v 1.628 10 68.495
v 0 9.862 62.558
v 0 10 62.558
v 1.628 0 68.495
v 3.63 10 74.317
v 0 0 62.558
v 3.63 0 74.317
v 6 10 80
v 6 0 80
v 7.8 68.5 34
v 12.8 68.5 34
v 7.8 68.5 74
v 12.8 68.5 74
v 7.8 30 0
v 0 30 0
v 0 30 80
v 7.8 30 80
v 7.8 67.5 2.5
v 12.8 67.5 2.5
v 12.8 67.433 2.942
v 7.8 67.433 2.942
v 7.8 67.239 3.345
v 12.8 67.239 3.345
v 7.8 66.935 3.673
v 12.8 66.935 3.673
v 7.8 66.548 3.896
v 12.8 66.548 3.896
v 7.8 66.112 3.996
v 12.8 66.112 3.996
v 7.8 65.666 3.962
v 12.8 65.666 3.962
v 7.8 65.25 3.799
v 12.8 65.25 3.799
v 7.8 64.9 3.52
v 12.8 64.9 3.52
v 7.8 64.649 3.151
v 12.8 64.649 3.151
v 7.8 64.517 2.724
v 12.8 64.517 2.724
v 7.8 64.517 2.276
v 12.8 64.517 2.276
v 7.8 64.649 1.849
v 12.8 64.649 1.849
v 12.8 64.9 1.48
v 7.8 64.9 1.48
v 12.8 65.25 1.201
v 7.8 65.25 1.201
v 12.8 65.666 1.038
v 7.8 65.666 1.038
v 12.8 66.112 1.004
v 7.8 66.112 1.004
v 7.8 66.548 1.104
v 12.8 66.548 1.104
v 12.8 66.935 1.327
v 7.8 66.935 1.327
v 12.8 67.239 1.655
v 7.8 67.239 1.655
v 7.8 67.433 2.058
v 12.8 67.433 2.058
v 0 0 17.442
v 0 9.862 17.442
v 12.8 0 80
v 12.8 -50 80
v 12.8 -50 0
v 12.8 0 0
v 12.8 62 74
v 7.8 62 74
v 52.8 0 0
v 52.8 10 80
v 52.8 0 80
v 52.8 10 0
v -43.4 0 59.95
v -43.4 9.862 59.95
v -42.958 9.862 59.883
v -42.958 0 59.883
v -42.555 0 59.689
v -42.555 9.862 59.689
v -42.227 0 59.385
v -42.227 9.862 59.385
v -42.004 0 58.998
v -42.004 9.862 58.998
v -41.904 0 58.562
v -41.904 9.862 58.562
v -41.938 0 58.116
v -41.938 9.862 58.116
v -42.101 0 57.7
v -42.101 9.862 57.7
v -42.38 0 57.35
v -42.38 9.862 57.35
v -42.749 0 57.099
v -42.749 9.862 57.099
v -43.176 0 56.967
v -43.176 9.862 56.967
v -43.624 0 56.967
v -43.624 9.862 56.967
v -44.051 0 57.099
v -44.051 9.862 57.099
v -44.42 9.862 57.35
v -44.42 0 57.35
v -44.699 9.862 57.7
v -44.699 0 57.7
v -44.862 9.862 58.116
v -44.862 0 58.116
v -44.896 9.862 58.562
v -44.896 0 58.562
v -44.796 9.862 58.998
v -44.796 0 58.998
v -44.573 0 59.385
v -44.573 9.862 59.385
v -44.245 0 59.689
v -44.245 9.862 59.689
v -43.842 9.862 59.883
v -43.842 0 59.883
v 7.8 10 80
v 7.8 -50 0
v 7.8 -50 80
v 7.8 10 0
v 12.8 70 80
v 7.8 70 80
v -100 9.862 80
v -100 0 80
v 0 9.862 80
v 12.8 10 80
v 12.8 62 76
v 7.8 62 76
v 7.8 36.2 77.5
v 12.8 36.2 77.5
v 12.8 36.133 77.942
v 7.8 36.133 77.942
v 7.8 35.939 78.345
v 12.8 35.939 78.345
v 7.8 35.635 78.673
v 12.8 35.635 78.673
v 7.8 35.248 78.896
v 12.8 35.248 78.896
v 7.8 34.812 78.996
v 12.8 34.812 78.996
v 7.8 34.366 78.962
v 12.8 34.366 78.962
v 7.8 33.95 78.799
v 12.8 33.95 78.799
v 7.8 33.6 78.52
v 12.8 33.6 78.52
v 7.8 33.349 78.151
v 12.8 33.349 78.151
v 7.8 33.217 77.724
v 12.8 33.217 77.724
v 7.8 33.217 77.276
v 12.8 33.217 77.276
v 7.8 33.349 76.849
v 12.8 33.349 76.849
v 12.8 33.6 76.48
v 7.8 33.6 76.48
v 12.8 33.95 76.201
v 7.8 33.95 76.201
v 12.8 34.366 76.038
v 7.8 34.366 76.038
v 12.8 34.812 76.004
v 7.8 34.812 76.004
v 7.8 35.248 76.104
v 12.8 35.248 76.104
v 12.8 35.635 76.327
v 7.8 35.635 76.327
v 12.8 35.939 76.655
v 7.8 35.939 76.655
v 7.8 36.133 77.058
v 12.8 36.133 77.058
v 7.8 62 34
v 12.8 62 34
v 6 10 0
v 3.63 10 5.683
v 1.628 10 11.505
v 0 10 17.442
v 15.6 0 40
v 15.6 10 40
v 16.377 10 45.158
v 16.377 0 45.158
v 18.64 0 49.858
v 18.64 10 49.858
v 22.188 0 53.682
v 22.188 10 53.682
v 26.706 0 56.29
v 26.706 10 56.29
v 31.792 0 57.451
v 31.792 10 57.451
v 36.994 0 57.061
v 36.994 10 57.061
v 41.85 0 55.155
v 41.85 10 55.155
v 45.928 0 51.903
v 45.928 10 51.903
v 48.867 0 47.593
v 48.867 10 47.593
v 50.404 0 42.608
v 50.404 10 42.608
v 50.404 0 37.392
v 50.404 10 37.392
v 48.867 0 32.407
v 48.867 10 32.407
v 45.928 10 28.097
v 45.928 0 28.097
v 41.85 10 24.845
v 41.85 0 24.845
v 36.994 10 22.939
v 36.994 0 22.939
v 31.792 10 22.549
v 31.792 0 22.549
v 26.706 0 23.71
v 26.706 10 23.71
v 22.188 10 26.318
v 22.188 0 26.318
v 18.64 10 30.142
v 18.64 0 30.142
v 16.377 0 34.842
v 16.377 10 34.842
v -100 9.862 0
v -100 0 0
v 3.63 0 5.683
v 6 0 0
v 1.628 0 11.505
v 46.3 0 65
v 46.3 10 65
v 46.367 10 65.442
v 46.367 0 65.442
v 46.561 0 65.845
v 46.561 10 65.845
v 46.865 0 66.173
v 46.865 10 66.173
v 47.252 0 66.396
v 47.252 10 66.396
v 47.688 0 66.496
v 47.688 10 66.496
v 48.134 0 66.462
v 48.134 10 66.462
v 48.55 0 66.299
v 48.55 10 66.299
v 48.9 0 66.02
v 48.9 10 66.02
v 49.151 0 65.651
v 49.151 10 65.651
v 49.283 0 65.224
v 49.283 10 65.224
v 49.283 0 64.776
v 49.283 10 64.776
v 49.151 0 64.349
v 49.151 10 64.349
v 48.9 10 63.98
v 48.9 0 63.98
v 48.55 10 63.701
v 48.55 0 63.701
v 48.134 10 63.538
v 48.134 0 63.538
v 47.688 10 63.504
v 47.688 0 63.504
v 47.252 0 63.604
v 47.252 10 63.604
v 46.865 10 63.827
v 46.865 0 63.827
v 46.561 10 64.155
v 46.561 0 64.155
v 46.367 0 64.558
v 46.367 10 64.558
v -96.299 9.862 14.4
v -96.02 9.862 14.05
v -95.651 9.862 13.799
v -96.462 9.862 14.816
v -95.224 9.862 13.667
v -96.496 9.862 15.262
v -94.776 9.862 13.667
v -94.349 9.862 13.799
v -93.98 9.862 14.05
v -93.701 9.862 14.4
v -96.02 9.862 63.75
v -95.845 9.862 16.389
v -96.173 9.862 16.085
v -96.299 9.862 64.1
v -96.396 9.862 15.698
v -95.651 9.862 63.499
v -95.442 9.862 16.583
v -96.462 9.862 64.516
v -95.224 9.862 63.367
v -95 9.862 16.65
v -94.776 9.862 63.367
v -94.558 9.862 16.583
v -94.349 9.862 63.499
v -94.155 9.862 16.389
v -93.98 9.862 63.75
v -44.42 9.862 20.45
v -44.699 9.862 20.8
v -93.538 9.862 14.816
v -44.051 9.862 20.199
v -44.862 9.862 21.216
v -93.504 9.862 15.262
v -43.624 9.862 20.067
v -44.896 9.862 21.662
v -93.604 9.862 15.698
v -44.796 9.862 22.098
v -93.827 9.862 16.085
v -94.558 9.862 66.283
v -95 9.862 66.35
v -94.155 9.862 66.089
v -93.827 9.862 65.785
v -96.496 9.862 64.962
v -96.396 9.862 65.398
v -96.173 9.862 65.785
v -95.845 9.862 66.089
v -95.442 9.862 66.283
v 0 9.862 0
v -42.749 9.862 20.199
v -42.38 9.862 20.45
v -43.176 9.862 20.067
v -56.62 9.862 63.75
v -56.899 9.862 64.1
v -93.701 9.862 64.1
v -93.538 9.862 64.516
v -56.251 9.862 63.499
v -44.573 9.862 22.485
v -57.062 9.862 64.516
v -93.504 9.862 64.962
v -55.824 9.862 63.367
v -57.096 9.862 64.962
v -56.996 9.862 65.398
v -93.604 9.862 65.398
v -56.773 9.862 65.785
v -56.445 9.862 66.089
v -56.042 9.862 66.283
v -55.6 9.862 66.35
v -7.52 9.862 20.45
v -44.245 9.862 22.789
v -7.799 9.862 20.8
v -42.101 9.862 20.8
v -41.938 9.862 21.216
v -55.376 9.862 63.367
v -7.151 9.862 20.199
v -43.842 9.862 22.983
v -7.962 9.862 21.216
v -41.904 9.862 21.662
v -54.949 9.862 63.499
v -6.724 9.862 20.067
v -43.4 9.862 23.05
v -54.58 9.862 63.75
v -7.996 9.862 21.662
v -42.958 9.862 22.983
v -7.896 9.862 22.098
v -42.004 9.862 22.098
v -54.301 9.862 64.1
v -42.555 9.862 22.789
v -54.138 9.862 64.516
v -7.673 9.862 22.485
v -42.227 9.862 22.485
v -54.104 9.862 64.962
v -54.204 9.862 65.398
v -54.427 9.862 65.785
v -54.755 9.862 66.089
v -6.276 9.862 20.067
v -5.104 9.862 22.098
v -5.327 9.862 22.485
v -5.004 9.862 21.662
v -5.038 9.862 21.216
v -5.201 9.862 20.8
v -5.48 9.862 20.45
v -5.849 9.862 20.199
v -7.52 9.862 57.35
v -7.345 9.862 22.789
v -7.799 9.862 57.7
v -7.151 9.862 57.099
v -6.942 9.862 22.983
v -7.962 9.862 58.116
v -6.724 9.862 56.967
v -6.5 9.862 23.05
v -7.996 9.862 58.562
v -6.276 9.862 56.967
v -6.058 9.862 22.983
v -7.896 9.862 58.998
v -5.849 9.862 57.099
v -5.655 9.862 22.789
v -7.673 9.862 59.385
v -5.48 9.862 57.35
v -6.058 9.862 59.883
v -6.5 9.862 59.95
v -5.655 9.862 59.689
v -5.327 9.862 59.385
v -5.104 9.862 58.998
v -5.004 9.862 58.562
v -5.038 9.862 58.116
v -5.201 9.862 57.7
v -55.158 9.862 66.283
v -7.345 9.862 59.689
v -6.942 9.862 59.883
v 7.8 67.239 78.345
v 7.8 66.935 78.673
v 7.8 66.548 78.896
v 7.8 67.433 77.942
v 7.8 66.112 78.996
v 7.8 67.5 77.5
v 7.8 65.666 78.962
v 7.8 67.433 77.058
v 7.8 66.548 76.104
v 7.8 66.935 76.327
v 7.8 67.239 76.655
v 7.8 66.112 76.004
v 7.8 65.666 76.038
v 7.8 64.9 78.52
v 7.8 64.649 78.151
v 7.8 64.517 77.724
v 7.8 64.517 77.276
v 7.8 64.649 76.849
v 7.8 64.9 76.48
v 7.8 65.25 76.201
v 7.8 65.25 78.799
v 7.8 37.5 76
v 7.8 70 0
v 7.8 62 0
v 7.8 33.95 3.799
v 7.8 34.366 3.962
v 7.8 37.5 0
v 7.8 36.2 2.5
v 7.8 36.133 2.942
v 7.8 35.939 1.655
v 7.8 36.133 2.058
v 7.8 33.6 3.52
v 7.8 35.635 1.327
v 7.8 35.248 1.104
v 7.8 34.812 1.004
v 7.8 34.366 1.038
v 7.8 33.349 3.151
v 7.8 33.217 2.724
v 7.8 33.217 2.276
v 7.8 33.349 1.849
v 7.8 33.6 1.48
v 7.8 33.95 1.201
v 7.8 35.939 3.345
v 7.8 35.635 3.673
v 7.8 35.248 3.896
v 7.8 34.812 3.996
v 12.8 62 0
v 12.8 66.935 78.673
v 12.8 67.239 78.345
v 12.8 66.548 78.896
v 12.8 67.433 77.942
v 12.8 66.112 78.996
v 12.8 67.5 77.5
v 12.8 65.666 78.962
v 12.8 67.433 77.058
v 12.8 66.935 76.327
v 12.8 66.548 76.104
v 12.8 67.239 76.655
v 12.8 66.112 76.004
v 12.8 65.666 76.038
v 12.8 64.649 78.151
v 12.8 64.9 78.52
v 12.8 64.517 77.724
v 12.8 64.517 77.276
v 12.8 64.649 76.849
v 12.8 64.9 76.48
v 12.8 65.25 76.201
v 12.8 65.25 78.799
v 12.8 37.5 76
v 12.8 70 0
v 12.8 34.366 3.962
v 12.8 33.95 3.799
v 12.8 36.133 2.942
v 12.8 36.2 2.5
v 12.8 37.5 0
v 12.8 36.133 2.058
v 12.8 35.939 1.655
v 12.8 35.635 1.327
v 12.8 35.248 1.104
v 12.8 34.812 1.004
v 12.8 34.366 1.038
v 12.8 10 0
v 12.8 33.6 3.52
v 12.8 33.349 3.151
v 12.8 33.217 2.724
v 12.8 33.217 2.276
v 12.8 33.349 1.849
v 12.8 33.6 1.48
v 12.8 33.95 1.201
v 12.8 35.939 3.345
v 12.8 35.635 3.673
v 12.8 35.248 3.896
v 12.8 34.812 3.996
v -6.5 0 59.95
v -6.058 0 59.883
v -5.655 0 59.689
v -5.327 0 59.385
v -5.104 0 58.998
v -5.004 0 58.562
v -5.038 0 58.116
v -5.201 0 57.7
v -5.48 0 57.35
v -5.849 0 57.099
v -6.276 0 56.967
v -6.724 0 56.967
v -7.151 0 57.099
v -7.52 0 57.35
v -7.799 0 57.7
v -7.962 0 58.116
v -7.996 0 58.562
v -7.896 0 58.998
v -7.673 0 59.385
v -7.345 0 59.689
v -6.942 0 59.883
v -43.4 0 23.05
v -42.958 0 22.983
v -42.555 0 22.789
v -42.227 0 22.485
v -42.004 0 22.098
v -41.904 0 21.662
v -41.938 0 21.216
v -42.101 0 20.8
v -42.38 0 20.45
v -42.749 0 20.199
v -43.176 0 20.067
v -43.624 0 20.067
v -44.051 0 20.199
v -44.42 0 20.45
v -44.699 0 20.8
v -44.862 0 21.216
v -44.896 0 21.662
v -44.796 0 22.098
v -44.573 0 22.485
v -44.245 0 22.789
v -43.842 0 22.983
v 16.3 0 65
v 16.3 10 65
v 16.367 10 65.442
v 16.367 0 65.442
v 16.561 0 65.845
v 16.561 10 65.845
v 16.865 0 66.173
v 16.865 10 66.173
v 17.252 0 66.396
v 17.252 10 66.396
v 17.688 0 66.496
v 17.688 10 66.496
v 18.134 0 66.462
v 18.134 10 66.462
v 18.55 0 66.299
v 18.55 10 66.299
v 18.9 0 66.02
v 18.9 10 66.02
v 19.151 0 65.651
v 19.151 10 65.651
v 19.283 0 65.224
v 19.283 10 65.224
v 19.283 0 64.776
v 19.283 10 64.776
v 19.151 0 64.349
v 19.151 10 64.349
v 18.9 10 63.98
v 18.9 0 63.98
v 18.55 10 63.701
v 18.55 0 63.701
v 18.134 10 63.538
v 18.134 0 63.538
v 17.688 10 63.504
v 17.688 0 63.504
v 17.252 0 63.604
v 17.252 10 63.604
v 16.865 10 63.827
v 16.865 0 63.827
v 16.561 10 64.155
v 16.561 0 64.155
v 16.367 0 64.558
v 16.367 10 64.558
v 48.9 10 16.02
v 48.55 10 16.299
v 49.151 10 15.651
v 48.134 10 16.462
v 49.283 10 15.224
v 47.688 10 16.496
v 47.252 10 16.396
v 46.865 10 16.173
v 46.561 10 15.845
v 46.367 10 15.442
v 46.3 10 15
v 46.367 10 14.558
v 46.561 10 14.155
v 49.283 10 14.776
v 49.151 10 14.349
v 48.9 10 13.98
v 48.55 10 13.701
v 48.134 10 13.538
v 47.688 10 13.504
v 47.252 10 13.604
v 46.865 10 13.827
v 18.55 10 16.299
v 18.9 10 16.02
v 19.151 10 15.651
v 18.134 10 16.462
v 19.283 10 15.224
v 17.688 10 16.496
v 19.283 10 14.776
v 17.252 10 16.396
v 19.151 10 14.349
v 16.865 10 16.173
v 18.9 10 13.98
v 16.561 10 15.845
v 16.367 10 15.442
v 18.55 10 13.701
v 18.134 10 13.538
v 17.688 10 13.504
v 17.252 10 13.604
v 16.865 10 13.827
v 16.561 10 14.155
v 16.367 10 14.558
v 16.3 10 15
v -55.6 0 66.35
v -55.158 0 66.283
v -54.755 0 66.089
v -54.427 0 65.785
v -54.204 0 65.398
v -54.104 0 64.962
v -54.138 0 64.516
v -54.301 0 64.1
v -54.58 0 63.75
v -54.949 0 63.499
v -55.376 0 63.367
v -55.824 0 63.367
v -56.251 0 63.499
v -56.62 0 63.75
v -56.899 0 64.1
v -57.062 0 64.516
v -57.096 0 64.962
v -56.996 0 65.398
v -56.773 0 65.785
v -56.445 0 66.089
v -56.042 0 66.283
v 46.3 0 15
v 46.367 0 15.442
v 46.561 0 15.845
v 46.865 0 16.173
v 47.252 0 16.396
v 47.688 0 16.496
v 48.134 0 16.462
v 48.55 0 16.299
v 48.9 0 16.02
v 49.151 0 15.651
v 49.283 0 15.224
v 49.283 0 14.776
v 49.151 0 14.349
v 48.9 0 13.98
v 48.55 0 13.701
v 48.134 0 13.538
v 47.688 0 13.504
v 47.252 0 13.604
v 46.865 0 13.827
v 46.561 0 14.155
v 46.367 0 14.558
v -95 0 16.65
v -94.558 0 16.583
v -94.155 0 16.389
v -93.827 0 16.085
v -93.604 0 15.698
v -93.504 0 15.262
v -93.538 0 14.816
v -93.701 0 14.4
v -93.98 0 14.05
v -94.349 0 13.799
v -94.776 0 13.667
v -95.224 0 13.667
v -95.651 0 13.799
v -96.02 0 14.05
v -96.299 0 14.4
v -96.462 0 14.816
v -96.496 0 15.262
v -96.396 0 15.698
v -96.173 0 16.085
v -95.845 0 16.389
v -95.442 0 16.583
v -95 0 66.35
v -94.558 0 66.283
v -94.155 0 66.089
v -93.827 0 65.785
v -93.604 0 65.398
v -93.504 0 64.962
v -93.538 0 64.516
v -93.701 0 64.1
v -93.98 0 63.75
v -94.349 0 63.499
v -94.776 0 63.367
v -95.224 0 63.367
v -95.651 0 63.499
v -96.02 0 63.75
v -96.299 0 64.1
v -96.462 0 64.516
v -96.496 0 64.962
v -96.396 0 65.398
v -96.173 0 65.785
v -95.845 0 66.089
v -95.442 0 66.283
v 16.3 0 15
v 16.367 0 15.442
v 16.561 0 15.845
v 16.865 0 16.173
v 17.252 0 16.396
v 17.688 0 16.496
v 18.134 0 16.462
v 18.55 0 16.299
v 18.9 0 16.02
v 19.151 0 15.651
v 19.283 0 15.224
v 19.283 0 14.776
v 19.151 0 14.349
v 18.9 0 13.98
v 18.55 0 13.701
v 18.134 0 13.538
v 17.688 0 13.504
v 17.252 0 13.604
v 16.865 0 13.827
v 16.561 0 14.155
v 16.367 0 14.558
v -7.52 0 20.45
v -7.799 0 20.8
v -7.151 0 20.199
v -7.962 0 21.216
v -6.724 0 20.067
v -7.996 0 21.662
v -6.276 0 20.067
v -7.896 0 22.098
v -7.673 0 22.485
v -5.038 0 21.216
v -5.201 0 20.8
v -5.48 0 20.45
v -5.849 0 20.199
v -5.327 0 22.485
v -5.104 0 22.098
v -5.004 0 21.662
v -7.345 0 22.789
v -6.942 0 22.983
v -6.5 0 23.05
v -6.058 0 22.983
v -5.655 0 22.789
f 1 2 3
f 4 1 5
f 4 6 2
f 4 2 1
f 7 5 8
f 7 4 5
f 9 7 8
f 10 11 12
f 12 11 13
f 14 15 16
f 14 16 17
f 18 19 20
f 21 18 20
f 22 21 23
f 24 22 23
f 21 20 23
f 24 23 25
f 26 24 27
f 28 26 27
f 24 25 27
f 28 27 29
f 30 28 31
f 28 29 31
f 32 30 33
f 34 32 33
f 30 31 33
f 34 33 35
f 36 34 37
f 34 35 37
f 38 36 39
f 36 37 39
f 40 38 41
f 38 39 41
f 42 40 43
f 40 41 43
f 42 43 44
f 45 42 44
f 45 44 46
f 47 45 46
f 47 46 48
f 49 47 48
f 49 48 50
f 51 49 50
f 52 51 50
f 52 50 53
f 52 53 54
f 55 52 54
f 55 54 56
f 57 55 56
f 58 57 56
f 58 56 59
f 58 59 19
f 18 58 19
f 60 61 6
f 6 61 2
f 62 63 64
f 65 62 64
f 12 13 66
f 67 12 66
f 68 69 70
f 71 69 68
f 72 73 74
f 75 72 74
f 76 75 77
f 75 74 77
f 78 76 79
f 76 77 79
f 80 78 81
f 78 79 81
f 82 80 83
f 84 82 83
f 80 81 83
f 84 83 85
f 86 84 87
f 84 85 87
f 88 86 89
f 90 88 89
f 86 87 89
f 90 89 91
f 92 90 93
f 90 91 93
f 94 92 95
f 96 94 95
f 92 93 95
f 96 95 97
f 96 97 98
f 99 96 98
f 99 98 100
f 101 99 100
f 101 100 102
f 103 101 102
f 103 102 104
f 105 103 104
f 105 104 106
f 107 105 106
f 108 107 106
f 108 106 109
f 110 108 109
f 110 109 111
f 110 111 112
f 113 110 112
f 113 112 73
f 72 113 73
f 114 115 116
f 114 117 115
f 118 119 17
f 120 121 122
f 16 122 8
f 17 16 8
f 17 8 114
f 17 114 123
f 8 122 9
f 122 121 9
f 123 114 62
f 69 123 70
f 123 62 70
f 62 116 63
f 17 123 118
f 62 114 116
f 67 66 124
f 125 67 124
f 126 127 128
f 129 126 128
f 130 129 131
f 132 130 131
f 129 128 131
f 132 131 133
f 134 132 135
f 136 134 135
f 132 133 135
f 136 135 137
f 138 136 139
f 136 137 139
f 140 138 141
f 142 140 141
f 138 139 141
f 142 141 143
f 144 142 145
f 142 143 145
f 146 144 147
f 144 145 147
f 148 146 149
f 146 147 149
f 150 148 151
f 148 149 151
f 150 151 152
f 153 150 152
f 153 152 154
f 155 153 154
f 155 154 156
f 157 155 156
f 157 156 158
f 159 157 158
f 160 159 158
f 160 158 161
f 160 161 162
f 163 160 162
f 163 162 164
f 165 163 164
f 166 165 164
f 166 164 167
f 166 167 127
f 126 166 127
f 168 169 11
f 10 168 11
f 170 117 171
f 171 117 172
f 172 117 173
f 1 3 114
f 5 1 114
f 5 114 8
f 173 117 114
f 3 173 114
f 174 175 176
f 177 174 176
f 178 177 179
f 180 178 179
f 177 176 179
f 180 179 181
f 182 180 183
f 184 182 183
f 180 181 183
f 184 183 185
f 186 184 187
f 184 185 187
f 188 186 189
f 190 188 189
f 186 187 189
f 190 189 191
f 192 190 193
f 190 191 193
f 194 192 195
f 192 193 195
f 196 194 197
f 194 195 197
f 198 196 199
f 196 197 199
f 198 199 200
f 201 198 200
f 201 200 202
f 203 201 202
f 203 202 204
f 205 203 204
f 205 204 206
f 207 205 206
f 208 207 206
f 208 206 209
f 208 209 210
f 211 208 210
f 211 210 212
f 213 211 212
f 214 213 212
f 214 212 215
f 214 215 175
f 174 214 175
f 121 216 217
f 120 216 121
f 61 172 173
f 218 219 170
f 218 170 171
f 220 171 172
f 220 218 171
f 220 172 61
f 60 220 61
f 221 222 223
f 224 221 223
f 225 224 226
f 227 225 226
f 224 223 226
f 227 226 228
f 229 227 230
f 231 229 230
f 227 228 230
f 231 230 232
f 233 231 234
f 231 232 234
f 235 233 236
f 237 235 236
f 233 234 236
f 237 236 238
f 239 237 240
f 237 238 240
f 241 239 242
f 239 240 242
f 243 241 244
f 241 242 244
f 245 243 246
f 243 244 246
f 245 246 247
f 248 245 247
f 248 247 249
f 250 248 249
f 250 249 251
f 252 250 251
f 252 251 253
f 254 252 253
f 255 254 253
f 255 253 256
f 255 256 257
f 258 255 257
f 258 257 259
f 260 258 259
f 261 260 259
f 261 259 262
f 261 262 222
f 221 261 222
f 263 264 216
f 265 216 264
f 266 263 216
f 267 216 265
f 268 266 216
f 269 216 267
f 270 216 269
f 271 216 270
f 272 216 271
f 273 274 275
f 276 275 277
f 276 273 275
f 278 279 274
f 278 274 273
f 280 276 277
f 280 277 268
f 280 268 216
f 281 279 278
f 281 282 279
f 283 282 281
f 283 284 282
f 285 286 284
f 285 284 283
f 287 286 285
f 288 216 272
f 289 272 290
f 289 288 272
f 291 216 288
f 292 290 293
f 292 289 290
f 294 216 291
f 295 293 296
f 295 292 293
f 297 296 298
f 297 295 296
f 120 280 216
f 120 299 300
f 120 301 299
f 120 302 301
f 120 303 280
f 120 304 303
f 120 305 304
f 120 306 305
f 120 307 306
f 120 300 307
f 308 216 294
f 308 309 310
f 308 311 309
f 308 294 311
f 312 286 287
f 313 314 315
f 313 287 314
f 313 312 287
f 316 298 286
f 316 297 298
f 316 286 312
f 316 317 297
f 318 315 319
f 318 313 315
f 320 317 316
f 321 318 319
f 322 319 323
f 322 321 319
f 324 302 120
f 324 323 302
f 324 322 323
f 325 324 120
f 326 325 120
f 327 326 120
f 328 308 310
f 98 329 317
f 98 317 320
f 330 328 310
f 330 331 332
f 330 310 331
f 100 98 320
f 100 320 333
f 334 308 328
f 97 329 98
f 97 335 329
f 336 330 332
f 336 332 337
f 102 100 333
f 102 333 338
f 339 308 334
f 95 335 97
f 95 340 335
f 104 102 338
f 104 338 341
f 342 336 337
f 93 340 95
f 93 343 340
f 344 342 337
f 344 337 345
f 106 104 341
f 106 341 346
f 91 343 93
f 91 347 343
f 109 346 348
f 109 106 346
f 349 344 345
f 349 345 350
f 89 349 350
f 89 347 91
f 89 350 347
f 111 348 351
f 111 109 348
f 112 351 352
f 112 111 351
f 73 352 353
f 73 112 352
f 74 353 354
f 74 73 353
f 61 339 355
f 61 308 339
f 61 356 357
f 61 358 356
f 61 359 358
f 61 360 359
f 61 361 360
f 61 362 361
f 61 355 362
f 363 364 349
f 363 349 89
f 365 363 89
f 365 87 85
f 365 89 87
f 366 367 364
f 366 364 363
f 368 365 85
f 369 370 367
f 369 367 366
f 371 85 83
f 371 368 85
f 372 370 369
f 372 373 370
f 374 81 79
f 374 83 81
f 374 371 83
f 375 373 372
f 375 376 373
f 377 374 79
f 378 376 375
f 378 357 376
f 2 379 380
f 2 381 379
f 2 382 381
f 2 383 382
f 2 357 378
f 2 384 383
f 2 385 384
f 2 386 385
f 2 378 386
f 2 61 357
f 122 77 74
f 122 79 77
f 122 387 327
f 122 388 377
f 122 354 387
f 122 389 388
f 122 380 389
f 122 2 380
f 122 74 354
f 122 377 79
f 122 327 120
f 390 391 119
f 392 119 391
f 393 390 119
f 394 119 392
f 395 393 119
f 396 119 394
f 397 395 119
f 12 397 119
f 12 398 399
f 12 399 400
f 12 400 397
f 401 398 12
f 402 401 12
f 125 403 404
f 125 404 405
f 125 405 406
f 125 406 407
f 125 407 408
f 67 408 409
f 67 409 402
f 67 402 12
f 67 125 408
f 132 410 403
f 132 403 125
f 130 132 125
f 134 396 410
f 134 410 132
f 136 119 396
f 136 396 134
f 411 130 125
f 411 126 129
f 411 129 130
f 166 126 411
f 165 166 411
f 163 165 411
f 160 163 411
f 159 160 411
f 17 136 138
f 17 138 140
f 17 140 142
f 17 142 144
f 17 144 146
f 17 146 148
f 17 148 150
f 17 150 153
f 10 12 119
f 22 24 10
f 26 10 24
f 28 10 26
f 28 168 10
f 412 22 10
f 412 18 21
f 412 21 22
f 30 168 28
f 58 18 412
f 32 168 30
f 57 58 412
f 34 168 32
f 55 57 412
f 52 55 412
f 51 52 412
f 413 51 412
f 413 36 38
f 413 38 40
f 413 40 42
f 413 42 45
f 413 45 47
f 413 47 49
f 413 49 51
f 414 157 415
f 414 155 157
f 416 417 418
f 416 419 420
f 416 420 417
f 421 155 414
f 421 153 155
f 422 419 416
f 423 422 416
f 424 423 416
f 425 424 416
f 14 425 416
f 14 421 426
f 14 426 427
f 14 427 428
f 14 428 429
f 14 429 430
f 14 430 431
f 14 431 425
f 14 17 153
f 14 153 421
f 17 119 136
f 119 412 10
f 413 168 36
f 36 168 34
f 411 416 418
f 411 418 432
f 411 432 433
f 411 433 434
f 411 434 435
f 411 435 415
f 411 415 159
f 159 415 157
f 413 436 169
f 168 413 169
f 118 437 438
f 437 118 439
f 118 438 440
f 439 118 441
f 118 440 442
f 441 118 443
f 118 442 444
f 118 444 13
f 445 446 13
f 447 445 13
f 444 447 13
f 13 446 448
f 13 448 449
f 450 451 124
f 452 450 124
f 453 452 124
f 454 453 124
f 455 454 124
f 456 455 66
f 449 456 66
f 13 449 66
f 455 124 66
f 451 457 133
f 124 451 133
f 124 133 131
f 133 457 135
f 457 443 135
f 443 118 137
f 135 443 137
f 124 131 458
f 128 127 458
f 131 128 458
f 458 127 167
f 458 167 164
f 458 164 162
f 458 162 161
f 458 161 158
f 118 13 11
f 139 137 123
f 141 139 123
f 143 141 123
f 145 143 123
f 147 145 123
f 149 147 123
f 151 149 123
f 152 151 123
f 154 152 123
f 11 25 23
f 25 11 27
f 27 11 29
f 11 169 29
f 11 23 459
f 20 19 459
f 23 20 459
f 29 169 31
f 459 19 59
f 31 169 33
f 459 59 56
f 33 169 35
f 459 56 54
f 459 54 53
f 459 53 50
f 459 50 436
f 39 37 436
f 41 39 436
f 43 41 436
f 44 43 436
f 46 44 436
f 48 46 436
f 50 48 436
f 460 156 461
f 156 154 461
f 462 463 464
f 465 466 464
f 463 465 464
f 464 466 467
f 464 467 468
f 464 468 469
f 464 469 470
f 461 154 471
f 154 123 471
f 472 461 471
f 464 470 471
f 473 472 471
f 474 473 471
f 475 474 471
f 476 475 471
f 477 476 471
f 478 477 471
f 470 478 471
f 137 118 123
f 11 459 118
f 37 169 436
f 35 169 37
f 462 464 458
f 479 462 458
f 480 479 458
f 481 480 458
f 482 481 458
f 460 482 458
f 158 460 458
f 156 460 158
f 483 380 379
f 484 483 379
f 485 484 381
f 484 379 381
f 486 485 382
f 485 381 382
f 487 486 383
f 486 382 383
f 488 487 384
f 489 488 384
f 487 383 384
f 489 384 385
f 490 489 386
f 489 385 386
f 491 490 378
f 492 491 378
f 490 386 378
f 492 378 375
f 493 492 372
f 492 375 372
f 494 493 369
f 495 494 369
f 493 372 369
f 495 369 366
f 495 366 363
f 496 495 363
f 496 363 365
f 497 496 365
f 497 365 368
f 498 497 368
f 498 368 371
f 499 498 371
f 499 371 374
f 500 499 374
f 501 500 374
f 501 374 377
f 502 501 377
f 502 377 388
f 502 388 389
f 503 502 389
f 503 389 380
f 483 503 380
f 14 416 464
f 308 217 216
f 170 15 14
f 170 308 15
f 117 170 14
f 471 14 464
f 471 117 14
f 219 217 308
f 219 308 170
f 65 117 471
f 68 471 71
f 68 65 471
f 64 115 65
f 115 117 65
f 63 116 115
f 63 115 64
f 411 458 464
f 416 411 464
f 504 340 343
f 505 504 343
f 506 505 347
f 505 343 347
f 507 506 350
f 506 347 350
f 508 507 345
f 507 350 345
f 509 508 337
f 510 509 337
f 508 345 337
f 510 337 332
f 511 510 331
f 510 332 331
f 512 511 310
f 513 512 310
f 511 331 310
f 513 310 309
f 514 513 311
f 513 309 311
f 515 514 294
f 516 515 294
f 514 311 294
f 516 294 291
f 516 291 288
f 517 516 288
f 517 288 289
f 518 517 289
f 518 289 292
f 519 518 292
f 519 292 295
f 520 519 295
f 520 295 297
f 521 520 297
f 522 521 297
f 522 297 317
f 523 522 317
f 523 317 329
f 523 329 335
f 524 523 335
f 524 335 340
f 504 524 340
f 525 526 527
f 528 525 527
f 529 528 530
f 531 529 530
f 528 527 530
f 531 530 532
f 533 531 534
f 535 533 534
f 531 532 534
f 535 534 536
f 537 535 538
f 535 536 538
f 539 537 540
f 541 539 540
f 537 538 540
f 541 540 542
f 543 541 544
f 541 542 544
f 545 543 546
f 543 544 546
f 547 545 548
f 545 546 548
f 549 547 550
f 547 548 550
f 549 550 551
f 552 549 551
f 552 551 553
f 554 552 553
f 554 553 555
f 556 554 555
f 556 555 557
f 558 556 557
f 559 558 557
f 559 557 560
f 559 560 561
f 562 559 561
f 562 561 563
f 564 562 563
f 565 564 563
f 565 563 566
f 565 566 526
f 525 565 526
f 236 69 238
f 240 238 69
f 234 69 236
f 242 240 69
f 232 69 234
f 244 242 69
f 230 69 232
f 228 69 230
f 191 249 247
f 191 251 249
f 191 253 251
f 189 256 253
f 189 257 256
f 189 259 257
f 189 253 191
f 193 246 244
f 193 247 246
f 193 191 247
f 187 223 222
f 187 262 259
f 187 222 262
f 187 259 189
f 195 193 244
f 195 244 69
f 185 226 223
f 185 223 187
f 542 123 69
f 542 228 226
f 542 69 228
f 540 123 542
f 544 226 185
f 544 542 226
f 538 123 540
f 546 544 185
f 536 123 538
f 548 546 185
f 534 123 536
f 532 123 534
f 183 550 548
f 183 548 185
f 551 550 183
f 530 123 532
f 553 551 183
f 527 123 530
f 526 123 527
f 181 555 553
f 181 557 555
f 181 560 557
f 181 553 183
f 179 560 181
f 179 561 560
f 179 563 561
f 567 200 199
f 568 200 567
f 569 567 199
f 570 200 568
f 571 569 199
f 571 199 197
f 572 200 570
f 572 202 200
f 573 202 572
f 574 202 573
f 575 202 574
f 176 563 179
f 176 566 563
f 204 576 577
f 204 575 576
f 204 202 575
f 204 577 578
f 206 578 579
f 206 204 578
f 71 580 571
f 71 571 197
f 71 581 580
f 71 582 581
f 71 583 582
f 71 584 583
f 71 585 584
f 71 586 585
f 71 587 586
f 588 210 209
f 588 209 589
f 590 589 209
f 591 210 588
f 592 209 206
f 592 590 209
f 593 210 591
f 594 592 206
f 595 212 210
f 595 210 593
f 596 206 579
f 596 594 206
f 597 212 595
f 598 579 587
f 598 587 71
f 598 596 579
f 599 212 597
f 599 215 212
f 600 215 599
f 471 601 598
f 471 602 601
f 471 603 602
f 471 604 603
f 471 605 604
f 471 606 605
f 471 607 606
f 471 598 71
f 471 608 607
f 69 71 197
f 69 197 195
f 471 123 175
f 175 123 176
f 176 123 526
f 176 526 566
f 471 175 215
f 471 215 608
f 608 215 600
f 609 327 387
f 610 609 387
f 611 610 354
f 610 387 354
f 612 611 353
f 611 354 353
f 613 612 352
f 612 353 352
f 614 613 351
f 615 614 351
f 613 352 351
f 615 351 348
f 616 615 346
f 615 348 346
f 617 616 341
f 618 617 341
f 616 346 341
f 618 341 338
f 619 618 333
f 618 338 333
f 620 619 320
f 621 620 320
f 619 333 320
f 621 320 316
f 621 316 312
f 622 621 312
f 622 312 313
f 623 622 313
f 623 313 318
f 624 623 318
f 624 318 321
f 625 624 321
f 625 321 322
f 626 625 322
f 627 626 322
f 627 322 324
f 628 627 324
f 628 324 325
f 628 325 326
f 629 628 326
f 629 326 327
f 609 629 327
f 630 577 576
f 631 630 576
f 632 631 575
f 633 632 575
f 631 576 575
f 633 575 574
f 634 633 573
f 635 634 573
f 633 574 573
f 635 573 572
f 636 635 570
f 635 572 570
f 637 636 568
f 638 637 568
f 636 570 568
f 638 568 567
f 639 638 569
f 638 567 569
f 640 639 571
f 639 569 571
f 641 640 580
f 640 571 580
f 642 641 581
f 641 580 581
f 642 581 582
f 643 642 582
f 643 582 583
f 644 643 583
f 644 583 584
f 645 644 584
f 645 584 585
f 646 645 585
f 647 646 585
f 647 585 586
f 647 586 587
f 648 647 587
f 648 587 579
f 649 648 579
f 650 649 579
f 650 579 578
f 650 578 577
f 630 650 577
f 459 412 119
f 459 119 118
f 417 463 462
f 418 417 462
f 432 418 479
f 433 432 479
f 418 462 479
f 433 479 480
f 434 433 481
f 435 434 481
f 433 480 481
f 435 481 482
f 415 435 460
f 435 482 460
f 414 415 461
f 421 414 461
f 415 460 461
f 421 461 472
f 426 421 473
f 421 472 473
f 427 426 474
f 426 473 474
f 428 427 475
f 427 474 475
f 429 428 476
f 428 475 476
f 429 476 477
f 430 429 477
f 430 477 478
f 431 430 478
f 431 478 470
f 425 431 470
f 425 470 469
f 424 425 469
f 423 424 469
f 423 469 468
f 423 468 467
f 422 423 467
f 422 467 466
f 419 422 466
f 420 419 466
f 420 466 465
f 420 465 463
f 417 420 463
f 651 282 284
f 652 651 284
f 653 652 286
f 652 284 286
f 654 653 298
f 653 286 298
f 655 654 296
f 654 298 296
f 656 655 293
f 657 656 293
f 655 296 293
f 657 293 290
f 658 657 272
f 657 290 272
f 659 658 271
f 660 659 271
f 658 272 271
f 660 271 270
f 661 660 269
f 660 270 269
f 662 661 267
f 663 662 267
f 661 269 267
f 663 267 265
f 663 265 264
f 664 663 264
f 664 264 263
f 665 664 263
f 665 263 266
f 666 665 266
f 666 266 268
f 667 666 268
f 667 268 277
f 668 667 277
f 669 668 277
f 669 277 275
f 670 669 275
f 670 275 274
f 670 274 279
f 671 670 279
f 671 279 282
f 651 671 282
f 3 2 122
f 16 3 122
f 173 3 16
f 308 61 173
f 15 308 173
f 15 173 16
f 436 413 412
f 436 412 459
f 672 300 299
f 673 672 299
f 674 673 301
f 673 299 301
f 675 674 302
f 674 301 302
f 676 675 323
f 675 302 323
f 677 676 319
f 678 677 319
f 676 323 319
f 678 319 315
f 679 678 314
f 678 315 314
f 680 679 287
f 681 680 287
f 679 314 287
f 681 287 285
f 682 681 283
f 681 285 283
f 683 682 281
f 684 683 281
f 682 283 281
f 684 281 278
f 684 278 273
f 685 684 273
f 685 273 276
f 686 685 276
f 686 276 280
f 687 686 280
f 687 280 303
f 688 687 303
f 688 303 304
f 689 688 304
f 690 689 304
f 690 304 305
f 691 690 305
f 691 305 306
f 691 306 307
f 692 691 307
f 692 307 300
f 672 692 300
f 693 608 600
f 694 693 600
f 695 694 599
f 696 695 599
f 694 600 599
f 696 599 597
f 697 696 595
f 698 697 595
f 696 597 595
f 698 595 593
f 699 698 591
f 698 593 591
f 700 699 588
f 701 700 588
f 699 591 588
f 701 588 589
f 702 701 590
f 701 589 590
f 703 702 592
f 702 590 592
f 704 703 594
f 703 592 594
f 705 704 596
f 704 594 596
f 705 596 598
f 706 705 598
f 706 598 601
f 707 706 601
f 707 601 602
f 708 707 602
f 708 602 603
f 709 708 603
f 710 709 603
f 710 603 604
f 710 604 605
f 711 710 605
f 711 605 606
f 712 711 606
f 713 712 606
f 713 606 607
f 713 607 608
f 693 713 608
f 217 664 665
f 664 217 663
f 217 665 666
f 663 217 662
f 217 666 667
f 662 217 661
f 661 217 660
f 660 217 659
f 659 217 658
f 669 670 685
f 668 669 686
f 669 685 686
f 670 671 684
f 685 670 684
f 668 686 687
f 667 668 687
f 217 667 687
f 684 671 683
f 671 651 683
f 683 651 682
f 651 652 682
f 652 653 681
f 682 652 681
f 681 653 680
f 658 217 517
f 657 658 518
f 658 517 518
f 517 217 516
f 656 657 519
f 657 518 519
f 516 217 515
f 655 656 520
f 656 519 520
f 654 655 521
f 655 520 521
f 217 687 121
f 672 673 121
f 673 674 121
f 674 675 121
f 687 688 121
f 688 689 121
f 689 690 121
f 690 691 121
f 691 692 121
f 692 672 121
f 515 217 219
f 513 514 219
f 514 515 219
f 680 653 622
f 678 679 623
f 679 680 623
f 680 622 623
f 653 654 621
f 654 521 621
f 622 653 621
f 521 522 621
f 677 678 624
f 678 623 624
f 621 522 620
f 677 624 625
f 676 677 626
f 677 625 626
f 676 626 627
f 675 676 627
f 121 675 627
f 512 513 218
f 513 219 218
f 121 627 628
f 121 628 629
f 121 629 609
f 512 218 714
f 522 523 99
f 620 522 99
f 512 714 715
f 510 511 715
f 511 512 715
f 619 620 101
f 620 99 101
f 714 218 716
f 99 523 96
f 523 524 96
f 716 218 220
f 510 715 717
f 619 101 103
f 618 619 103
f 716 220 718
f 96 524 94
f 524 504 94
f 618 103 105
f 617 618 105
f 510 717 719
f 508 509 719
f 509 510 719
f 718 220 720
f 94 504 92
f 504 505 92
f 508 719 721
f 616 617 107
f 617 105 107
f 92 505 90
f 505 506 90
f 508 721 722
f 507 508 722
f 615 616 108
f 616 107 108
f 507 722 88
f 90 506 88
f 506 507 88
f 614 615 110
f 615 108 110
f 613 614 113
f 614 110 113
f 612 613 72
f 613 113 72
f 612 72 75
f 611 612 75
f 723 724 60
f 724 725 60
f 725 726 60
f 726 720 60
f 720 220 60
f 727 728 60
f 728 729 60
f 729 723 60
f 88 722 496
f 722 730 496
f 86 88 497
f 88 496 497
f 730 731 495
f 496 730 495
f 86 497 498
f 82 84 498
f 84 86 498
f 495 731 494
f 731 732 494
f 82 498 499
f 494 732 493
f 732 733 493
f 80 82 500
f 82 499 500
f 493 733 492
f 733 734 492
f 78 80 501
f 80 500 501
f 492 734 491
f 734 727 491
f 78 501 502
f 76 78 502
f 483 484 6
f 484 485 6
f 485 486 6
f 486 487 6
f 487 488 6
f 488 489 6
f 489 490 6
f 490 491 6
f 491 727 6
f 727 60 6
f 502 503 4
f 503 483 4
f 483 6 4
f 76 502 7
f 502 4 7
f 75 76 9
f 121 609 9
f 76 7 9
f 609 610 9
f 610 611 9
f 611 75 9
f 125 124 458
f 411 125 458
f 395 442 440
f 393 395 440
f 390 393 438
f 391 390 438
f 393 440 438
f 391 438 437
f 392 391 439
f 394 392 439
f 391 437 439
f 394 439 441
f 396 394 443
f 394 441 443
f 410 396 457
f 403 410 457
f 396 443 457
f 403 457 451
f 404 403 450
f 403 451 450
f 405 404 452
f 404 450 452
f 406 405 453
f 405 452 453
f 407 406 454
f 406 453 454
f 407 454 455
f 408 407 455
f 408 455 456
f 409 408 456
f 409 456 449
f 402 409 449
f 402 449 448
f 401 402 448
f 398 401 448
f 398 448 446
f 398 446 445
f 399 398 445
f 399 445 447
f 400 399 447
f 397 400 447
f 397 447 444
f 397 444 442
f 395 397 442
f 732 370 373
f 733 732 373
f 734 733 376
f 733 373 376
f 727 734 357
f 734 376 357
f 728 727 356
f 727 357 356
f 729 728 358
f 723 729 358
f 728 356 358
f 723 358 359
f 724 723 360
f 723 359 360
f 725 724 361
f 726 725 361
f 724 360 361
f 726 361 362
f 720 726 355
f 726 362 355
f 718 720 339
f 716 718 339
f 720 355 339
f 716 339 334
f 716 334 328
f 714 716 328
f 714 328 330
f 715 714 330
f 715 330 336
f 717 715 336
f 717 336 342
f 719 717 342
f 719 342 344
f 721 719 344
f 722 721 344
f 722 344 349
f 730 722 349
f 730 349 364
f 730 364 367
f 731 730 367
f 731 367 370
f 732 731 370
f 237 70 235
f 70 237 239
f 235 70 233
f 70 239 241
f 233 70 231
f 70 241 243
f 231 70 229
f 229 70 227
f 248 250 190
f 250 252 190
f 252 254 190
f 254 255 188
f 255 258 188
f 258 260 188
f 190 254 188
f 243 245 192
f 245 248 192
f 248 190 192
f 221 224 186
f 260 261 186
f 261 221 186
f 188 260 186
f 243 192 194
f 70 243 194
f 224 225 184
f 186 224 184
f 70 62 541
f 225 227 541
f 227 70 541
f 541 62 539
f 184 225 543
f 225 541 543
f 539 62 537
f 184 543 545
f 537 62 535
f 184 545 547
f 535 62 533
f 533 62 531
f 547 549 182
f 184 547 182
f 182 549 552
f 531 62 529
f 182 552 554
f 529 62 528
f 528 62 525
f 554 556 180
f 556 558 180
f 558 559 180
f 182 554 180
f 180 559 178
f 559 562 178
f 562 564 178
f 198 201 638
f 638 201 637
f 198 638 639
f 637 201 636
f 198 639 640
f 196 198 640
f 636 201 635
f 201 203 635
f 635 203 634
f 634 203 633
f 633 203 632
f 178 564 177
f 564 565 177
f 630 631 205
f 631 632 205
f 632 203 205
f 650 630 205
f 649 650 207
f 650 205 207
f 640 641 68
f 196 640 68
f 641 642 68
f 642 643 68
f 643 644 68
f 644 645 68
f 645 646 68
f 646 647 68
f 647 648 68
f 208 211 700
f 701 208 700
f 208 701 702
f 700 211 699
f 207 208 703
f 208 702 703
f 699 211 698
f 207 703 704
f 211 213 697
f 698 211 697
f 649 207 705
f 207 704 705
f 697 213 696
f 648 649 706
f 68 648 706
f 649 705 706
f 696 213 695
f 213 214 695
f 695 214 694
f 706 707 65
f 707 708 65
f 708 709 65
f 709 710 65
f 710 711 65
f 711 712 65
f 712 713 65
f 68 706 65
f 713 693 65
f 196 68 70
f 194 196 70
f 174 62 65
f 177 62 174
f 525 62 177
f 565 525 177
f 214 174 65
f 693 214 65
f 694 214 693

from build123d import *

# Parameters (mm, degrees)
BOSS_EXTRUDE1_DEPTH   = 80
CORTE_EXTRUS_O1_DEPTH = 10
SKETCH3_W             = 5
SKETCH3_H             = 80
BOSS_EXTRUDE2_DEPTH   = 50
SKETCH4_W             = 80
SKETCH4_H             = 9.86245083
BOSS_EXTRUDE3_DEPTH   = 100
SKETCH5_R             = 1.5
CUT_EXTRUDE1_DEPTH    = 40
SKETCH6_W             = 5
SKETCH6_H             = 80
BOSS_EXTRUDE4_DEPTH   = 40
SKETCH7_R             = 1.5
CUT_EXTRUDE2_DEPTH    = 40
SKETCH8_W             = 80
SKETCH8_H             = 10
BOSS_EXTRUDE5_DEPTH   = 40
SKETCH9_R             = 1.5
SKETCH9_R_2           = 17.5
CUT_EXTRUDE3_DEPTH    = 40


with BuildPart() as part:
    # Sketch1 → Boss-Extrude1 (new body)
    with BuildSketch(Plane.XY):
        Polygon((0, 0), (0, 30), (12.8, 30), (12.8, 0), (7.8, 0), (7.8, 10), (6, 10), (6, 0), align=None)
    extrude(amount=BOSS_EXTRUDE1_DEPTH)

    # Esboço2 → Corte-extrusão1 (cut)
    with BuildSketch(Plane.XZ):
        with BuildLine():
            Line((6, 80), (6, 0))
            ThreePointArc((6, 0), (-2.670710227, 40), (6, 80))
        make_face()
    extrude(amount=-CORTE_EXTRUS_O1_DEPTH, mode=Mode.SUBTRACT)

    # Sketch3 → Boss-Extrude2 (add)
    with BuildSketch(Plane.XZ):
        with Locations((10.3, 40)):
            Rectangle(SKETCH3_W, SKETCH3_H)
    extrude(amount=BOSS_EXTRUDE2_DEPTH)

    # Sketch4 → Boss-Extrude3 (add)
    with BuildSketch(Plane.ZY):
        with Locations((40, 4.931225415)):
            Rectangle(SKETCH4_W, SKETCH4_H)
    extrude(amount=BOSS_EXTRUDE3_DEPTH)

    # Sketch5 → Cut-Extrude1 (cut)
    with BuildSketch(Plane(origin=(0, 9.86245083, 0), x_dir=(1, 0, 0), z_dir=(0, 1, 0))):
        with Locations(Location((-6.5, -21.55, 0), (0, 0, 270))):
            Circle(SKETCH5_R)
        with Locations(Location((-6.5, -58.45, 0), (0, 0, 270))):
            Circle(SKETCH5_R)
        with Locations(Location((-43.4, -21.55, 0), (0, 0, 270))):
            Circle(SKETCH5_R)
        with Locations(Location((-43.4, -58.45, 0), (0, 0, 270))):
            Circle(SKETCH5_R)
        with Locations(Location((-55.6, -64.85, 0), (0, 0, 270))):
            Circle(SKETCH5_R)
        with Locations(Location((-95, -64.85, 0), (0, 0, 270))):
            Circle(SKETCH5_R)
        with Locations(Location((-95, -15.15, 0), (0, 0, 270))):
            Circle(SKETCH5_R)
    extrude(amount=-CUT_EXTRUDE1_DEPTH, mode=Mode.SUBTRACT)

    # Sketch6 → Boss-Extrude4 (add)
    with BuildSketch(Plane(origin=(0, 30, 0), x_dir=(1, 0, 0), z_dir=(0, 1, 0))):
        with Locations((10.3, -40)):
            Rectangle(SKETCH6_W, SKETCH6_H)
    extrude(amount=BOSS_EXTRUDE4_DEPTH)

    # Sketch7 → Cut-Extrude2 (cut)
    with BuildSketch(Plane(origin=(12.8, 0, 0), x_dir=(0, 0, -1), z_dir=(1, 0, 0))):
        with Locations(Location((-77.5, 66, 0), (0, 0, 90))):
            Circle(SKETCH7_R)
        with Locations(Location((-2.5, 66, 0), (0, 0, 90))):
            Circle(SKETCH7_R)
        with Locations(Location((-2.5, 34.7, 0), (0, 0, 90))):
            Circle(SKETCH7_R)
        with Locations(Location((-77.5, 34.7, 0), (0, 0, 90))):
            Circle(SKETCH7_R)
        Polygon((-74, 68.5), (-74, 62), (-76, 62), (-76, 37.5), (0, 37.5), (0, 62), (-34, 62), (-34, 68.5), align=None)
    extrude(amount=-CUT_EXTRUDE2_DEPTH, mode=Mode.SUBTRACT)

    # Sketch8 → Boss-Extrude5 (add)
    with BuildSketch(Plane(origin=(12.8, 0, 0), x_dir=(0, 0, -1), z_dir=(1, 0, 0))):
        with Locations((-40, 5)):
            Rectangle(SKETCH8_W, SKETCH8_H)
    extrude(amount=BOSS_EXTRUDE5_DEPTH)

    # Sketch9 → Cut-Extrude3 (cut)
    with BuildSketch(Plane(origin=(0, 10, 0), x_dir=(1, 0, 0), z_dir=(0, 1, 0))):
        with Locations(Location((47.8, -65, 0), (0, 0, 180))):
            Circle(SKETCH9_R)
        with Locations(Location((17.8, -65, 0), (0, 0, 180))):
            Circle(SKETCH9_R)
        with Locations(Location((47.8, -15, 0), (0, 0, 180))):
            Circle(SKETCH9_R)
        with Locations(Location((17.8, -15, 0), (0, 0, 180))):
            Circle(SKETCH9_R)
        with Locations(Location((33.099545745, -40, 0), (0, 0, 180))):
            Circle(SKETCH9_R_2)
    extrude(amount=-CUT_EXTRUDE3_DEPTH, mode=Mode.SUBTRACT)


solid = part.part
